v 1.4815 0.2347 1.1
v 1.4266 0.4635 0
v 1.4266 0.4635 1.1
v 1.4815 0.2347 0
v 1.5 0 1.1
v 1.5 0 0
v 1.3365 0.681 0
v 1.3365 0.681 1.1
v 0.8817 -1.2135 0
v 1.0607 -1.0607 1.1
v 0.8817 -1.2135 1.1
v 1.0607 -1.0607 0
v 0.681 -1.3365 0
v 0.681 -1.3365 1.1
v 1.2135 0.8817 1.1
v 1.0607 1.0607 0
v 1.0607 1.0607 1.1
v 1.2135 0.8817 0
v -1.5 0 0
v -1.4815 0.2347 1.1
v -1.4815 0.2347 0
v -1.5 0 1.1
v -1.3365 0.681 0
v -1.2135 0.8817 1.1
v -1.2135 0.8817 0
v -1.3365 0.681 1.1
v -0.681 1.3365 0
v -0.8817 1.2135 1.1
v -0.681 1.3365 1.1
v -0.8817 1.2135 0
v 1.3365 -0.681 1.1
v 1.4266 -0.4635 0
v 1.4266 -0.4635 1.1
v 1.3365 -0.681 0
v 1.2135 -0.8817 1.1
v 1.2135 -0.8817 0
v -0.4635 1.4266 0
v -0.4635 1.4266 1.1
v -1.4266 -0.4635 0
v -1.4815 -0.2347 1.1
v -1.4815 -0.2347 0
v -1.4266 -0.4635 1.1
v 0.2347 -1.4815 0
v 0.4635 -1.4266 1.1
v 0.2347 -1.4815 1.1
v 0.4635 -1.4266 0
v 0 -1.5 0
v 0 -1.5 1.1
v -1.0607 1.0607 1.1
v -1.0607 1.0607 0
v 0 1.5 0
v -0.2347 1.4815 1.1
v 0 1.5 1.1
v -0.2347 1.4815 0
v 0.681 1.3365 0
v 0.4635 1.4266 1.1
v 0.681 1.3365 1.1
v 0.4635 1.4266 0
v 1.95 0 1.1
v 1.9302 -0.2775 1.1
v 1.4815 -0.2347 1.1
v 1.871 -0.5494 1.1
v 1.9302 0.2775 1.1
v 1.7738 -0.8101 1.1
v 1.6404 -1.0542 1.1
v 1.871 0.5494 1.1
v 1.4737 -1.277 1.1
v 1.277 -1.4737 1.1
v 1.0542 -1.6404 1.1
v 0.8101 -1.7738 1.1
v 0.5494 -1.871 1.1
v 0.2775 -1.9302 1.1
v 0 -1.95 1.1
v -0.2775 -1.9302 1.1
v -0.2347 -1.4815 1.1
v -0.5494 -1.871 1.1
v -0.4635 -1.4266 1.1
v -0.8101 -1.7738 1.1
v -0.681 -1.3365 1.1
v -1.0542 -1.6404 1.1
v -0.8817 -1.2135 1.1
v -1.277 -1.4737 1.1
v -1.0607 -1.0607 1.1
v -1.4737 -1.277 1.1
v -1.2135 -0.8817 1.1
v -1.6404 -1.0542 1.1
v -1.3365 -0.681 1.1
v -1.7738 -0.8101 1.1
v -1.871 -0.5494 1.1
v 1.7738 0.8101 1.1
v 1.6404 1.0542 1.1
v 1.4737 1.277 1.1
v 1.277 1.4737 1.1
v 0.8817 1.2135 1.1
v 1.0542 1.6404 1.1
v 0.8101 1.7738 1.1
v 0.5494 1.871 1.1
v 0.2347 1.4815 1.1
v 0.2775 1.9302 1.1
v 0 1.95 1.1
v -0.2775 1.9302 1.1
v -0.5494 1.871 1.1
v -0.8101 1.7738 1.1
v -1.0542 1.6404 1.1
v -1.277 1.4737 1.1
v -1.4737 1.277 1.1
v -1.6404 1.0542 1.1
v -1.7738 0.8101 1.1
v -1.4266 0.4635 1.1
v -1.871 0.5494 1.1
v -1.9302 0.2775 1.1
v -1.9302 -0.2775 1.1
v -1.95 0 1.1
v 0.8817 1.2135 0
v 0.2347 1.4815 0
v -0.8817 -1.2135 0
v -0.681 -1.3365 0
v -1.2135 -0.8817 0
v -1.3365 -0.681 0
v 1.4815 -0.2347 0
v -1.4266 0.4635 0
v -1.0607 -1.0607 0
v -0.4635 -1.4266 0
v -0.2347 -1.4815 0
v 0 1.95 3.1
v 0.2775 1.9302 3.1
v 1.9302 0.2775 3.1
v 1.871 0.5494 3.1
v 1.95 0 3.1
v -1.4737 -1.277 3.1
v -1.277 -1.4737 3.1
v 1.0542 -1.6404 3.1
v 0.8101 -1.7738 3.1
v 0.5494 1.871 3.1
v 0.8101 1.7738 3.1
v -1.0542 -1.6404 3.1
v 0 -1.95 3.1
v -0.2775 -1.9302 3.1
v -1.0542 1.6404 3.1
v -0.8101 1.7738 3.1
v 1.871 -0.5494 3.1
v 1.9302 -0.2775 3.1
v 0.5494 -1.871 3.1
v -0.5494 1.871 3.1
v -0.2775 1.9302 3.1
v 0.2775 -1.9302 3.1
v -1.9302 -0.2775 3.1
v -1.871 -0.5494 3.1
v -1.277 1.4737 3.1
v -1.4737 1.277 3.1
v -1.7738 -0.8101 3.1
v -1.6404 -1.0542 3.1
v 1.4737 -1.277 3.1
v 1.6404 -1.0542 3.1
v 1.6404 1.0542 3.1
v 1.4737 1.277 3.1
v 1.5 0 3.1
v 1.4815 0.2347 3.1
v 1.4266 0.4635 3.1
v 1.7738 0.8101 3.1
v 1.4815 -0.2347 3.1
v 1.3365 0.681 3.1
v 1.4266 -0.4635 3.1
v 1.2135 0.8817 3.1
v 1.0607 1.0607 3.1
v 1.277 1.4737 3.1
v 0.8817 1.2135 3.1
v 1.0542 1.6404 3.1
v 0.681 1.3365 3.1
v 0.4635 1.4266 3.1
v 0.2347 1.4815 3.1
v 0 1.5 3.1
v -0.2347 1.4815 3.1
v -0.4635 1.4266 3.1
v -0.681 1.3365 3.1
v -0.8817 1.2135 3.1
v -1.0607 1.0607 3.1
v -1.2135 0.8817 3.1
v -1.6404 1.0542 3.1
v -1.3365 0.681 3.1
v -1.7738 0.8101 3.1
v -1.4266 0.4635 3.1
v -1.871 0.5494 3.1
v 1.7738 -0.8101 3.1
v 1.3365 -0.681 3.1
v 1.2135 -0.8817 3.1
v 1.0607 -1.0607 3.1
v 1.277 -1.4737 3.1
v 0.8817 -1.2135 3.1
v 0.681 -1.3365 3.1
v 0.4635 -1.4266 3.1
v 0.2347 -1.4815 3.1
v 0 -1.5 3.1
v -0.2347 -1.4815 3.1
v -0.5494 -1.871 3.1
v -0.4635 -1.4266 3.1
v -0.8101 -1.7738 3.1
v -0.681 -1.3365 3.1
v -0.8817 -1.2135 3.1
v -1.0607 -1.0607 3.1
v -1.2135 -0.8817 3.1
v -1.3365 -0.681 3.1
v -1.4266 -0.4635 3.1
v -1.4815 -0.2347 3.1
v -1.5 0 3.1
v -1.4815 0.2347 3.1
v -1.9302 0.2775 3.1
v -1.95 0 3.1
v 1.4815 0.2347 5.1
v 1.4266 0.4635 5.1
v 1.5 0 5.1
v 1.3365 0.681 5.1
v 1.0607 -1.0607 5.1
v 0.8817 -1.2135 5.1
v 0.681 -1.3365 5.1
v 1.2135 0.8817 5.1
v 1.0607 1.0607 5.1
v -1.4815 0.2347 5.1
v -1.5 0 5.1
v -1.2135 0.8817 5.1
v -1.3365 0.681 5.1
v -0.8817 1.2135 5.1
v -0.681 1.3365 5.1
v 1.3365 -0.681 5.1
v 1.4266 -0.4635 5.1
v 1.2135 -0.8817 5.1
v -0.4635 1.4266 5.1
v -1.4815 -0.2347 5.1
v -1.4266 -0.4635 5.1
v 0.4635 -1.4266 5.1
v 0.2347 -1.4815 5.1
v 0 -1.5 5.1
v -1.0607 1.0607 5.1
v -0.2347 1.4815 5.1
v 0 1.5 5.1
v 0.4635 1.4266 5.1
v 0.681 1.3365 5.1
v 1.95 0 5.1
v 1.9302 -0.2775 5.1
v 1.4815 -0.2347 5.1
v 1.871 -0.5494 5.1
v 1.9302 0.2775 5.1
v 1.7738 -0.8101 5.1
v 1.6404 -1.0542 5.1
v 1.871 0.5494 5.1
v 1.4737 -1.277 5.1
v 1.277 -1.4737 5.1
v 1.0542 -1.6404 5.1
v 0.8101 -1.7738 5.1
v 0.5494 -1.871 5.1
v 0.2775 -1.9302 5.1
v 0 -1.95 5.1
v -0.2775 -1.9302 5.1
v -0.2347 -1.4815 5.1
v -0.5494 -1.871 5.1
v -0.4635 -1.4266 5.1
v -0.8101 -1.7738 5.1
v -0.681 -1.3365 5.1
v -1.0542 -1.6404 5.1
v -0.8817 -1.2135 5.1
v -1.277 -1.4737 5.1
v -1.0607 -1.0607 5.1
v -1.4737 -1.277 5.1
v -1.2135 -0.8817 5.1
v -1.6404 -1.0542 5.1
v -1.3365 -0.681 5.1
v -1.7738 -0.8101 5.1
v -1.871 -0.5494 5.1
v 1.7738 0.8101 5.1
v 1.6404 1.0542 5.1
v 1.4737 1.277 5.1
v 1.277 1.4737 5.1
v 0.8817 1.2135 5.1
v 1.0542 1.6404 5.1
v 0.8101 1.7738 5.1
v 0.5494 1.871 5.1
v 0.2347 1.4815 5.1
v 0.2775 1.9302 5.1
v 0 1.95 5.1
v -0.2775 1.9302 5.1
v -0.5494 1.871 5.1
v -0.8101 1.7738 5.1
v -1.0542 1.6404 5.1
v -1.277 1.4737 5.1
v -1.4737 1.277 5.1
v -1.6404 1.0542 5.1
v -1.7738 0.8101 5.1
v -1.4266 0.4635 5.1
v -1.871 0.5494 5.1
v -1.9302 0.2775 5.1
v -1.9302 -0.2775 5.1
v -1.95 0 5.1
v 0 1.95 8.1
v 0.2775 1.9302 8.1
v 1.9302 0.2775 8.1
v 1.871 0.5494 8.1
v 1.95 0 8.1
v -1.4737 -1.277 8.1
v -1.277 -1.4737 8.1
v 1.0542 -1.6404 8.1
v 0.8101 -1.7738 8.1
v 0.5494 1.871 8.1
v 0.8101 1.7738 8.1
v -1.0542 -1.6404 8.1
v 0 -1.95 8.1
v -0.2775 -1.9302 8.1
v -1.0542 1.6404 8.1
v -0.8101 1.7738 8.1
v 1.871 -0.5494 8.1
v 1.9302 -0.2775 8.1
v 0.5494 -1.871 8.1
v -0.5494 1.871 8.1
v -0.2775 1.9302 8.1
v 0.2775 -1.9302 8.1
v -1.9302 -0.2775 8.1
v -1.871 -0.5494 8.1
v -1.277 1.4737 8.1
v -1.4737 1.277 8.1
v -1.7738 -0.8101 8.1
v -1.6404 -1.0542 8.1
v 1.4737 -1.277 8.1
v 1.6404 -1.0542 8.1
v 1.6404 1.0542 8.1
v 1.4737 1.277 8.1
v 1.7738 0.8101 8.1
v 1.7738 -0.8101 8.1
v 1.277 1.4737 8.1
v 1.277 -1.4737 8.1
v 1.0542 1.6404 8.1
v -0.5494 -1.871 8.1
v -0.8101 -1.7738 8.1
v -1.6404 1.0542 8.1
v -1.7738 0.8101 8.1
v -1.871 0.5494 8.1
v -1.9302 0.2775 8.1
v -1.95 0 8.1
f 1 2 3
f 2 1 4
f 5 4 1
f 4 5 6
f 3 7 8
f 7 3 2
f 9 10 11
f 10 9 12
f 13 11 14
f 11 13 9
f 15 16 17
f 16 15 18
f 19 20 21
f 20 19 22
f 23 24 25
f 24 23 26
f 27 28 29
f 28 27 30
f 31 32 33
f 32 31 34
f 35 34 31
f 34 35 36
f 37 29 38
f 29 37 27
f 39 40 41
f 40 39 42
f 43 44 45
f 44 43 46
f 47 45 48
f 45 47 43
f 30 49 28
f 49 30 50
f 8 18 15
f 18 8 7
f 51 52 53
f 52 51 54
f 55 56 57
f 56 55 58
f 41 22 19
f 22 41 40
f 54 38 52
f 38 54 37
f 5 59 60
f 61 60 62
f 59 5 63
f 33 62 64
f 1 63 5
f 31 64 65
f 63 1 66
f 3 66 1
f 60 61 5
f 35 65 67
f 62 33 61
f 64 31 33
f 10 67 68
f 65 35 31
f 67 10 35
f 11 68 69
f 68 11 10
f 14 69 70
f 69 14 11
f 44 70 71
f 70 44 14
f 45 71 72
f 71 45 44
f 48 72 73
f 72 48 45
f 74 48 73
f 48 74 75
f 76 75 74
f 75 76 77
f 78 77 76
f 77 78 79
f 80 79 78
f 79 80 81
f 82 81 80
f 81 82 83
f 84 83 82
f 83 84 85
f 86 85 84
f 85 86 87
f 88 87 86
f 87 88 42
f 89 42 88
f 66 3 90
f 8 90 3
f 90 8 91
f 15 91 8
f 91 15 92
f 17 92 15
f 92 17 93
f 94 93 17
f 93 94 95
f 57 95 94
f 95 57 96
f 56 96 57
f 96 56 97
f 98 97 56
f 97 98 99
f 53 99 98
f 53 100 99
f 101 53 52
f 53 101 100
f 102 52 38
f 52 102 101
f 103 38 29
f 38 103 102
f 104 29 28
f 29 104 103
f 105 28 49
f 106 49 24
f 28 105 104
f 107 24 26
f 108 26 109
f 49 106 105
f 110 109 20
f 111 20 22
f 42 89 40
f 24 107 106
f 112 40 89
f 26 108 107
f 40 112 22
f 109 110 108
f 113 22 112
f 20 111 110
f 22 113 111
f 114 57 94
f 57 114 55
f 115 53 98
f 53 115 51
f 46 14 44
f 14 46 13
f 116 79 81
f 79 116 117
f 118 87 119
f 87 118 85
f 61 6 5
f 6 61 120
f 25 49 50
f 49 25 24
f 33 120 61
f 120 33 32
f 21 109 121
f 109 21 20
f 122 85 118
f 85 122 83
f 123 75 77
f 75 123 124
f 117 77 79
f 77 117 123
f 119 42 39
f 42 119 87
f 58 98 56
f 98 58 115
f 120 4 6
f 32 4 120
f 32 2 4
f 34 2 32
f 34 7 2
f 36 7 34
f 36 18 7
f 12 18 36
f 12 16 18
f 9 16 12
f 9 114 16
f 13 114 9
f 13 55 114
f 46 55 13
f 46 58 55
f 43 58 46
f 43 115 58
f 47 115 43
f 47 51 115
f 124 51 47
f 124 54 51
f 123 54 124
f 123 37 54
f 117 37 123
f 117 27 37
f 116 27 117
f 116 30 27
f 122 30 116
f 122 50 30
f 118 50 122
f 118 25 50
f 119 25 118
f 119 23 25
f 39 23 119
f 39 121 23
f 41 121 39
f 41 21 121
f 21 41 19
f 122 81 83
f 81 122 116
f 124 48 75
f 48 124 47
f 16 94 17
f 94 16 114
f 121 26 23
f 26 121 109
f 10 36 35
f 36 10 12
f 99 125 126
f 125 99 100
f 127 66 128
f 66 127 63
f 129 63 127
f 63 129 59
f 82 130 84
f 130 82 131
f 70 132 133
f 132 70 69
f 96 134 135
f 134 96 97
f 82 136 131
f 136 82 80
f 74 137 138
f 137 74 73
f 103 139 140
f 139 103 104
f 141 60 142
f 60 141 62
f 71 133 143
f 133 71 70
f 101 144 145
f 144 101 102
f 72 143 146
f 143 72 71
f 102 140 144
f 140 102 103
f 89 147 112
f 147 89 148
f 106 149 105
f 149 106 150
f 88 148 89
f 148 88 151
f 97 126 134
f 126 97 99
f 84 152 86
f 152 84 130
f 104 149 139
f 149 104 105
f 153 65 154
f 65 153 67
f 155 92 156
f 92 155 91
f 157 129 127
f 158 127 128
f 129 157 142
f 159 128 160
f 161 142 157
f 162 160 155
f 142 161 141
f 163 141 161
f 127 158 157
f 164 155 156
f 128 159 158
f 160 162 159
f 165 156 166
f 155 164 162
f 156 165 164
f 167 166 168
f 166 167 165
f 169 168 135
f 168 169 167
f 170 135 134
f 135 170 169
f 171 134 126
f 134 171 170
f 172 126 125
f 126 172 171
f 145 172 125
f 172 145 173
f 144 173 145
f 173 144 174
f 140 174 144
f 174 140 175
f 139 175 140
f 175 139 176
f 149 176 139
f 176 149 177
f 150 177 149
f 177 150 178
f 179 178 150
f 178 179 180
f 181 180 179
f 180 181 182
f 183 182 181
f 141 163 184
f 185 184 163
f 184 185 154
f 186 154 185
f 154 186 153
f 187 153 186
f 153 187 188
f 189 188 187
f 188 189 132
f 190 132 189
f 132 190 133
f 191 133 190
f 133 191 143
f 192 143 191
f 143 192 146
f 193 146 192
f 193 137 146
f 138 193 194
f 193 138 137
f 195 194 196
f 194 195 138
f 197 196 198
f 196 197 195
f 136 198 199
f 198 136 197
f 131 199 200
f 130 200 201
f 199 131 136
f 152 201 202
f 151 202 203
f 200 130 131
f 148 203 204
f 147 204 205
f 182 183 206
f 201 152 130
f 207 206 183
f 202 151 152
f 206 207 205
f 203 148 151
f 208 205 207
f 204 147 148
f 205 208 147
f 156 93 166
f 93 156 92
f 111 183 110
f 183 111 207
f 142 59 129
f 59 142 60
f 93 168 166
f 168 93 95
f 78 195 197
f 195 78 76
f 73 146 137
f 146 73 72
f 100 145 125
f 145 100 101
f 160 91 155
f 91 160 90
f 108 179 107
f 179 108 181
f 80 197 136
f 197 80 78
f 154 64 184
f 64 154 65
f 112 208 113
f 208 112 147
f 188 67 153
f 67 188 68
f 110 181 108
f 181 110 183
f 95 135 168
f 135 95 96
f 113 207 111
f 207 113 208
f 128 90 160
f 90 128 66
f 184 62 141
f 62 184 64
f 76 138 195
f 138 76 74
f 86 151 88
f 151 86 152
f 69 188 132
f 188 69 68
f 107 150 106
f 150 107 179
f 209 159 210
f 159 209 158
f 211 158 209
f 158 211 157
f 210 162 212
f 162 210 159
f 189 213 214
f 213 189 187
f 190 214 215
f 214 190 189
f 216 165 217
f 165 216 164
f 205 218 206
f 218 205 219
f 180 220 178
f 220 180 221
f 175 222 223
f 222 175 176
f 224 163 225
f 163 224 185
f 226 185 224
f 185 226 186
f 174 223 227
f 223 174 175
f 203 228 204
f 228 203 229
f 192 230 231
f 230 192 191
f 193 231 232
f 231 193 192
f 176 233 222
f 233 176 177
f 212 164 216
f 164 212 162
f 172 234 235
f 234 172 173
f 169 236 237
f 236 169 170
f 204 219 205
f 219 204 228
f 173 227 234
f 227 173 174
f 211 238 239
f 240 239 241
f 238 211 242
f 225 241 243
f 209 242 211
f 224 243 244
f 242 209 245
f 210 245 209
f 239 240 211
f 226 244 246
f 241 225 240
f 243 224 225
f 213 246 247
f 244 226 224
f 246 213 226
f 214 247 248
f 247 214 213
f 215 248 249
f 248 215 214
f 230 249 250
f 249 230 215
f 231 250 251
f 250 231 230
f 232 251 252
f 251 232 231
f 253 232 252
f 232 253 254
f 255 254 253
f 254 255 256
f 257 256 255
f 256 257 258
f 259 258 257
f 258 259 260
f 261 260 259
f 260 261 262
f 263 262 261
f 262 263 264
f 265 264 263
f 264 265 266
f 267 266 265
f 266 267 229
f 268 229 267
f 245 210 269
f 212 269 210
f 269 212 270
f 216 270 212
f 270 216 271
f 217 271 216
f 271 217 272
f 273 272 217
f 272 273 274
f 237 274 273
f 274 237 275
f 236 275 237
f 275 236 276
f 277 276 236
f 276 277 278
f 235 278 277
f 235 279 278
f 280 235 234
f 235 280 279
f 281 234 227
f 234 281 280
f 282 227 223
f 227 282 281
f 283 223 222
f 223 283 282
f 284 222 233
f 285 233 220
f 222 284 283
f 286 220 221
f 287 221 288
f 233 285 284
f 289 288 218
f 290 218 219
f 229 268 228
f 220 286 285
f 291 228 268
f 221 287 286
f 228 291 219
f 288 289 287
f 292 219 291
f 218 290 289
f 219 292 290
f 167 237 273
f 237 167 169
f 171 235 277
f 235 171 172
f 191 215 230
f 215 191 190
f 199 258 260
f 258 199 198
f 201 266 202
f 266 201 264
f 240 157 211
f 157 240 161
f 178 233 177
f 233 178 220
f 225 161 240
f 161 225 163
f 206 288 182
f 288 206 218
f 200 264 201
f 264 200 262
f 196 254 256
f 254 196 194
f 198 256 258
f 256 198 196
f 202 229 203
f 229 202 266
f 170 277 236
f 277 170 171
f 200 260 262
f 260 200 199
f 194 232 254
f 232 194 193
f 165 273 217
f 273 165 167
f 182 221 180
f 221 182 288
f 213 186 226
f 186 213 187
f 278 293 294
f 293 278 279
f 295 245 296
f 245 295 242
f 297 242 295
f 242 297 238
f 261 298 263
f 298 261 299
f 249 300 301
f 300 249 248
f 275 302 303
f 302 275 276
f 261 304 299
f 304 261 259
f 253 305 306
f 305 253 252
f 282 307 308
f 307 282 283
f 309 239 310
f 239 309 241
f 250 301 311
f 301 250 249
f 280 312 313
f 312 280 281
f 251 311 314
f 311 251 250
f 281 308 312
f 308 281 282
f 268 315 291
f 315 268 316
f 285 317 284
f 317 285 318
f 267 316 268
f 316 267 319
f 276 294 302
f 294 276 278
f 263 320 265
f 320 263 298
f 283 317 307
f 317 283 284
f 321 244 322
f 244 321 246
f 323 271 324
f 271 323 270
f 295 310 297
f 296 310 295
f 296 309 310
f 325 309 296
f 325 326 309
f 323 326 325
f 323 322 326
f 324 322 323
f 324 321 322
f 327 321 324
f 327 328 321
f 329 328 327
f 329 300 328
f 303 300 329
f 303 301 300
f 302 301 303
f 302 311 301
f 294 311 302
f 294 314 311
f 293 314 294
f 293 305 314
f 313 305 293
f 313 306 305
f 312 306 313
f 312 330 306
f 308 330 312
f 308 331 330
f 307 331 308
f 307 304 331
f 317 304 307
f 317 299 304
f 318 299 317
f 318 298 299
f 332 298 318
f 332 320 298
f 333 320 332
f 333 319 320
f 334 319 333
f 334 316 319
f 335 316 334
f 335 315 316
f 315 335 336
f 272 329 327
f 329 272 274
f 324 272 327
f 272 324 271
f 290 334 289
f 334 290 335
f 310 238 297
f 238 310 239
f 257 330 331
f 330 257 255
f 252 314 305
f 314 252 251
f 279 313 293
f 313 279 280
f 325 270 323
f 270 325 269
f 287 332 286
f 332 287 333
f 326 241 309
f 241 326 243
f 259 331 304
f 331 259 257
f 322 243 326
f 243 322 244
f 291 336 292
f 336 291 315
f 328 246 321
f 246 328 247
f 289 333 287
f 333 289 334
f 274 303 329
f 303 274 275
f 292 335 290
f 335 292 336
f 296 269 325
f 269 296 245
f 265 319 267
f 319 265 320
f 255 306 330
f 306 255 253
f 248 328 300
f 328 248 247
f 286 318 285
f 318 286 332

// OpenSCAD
// part_id: mar7
// name: Mars stepped axle
// source_drawing_ids: DRW-013
// units: mm
// revision: 0.1
// SPDX-License-Identifier: MIT

module part_mar7(
    d1 = 3.0,
    d2 = 3.9,
    d3 = 3.0,
    h1 = 1.1,
    h2 = 2.0,
    h3 = 2.0,
    h4 = 3.0,
    total_h = 8.1
) {
    union() {
        cylinder(d = d1, h = h1, center = false, $fn = 40);
        translate([0, 0, h1]) cylinder(d = d2, h = h2, center = false, $fn = 44);
        translate([0, 0, h1 + h2]) cylinder(d = d3, h = h3, center = false, $fn = 40);
        translate([0, 0, h1 + h2 + h3]) cylinder(d = d2, h = h4, center = false, $fn = 44);
    }
}

// ---- "main guard" ----
if (is_undef(__LIB_MODE__)) {
    part_mar7();
}
